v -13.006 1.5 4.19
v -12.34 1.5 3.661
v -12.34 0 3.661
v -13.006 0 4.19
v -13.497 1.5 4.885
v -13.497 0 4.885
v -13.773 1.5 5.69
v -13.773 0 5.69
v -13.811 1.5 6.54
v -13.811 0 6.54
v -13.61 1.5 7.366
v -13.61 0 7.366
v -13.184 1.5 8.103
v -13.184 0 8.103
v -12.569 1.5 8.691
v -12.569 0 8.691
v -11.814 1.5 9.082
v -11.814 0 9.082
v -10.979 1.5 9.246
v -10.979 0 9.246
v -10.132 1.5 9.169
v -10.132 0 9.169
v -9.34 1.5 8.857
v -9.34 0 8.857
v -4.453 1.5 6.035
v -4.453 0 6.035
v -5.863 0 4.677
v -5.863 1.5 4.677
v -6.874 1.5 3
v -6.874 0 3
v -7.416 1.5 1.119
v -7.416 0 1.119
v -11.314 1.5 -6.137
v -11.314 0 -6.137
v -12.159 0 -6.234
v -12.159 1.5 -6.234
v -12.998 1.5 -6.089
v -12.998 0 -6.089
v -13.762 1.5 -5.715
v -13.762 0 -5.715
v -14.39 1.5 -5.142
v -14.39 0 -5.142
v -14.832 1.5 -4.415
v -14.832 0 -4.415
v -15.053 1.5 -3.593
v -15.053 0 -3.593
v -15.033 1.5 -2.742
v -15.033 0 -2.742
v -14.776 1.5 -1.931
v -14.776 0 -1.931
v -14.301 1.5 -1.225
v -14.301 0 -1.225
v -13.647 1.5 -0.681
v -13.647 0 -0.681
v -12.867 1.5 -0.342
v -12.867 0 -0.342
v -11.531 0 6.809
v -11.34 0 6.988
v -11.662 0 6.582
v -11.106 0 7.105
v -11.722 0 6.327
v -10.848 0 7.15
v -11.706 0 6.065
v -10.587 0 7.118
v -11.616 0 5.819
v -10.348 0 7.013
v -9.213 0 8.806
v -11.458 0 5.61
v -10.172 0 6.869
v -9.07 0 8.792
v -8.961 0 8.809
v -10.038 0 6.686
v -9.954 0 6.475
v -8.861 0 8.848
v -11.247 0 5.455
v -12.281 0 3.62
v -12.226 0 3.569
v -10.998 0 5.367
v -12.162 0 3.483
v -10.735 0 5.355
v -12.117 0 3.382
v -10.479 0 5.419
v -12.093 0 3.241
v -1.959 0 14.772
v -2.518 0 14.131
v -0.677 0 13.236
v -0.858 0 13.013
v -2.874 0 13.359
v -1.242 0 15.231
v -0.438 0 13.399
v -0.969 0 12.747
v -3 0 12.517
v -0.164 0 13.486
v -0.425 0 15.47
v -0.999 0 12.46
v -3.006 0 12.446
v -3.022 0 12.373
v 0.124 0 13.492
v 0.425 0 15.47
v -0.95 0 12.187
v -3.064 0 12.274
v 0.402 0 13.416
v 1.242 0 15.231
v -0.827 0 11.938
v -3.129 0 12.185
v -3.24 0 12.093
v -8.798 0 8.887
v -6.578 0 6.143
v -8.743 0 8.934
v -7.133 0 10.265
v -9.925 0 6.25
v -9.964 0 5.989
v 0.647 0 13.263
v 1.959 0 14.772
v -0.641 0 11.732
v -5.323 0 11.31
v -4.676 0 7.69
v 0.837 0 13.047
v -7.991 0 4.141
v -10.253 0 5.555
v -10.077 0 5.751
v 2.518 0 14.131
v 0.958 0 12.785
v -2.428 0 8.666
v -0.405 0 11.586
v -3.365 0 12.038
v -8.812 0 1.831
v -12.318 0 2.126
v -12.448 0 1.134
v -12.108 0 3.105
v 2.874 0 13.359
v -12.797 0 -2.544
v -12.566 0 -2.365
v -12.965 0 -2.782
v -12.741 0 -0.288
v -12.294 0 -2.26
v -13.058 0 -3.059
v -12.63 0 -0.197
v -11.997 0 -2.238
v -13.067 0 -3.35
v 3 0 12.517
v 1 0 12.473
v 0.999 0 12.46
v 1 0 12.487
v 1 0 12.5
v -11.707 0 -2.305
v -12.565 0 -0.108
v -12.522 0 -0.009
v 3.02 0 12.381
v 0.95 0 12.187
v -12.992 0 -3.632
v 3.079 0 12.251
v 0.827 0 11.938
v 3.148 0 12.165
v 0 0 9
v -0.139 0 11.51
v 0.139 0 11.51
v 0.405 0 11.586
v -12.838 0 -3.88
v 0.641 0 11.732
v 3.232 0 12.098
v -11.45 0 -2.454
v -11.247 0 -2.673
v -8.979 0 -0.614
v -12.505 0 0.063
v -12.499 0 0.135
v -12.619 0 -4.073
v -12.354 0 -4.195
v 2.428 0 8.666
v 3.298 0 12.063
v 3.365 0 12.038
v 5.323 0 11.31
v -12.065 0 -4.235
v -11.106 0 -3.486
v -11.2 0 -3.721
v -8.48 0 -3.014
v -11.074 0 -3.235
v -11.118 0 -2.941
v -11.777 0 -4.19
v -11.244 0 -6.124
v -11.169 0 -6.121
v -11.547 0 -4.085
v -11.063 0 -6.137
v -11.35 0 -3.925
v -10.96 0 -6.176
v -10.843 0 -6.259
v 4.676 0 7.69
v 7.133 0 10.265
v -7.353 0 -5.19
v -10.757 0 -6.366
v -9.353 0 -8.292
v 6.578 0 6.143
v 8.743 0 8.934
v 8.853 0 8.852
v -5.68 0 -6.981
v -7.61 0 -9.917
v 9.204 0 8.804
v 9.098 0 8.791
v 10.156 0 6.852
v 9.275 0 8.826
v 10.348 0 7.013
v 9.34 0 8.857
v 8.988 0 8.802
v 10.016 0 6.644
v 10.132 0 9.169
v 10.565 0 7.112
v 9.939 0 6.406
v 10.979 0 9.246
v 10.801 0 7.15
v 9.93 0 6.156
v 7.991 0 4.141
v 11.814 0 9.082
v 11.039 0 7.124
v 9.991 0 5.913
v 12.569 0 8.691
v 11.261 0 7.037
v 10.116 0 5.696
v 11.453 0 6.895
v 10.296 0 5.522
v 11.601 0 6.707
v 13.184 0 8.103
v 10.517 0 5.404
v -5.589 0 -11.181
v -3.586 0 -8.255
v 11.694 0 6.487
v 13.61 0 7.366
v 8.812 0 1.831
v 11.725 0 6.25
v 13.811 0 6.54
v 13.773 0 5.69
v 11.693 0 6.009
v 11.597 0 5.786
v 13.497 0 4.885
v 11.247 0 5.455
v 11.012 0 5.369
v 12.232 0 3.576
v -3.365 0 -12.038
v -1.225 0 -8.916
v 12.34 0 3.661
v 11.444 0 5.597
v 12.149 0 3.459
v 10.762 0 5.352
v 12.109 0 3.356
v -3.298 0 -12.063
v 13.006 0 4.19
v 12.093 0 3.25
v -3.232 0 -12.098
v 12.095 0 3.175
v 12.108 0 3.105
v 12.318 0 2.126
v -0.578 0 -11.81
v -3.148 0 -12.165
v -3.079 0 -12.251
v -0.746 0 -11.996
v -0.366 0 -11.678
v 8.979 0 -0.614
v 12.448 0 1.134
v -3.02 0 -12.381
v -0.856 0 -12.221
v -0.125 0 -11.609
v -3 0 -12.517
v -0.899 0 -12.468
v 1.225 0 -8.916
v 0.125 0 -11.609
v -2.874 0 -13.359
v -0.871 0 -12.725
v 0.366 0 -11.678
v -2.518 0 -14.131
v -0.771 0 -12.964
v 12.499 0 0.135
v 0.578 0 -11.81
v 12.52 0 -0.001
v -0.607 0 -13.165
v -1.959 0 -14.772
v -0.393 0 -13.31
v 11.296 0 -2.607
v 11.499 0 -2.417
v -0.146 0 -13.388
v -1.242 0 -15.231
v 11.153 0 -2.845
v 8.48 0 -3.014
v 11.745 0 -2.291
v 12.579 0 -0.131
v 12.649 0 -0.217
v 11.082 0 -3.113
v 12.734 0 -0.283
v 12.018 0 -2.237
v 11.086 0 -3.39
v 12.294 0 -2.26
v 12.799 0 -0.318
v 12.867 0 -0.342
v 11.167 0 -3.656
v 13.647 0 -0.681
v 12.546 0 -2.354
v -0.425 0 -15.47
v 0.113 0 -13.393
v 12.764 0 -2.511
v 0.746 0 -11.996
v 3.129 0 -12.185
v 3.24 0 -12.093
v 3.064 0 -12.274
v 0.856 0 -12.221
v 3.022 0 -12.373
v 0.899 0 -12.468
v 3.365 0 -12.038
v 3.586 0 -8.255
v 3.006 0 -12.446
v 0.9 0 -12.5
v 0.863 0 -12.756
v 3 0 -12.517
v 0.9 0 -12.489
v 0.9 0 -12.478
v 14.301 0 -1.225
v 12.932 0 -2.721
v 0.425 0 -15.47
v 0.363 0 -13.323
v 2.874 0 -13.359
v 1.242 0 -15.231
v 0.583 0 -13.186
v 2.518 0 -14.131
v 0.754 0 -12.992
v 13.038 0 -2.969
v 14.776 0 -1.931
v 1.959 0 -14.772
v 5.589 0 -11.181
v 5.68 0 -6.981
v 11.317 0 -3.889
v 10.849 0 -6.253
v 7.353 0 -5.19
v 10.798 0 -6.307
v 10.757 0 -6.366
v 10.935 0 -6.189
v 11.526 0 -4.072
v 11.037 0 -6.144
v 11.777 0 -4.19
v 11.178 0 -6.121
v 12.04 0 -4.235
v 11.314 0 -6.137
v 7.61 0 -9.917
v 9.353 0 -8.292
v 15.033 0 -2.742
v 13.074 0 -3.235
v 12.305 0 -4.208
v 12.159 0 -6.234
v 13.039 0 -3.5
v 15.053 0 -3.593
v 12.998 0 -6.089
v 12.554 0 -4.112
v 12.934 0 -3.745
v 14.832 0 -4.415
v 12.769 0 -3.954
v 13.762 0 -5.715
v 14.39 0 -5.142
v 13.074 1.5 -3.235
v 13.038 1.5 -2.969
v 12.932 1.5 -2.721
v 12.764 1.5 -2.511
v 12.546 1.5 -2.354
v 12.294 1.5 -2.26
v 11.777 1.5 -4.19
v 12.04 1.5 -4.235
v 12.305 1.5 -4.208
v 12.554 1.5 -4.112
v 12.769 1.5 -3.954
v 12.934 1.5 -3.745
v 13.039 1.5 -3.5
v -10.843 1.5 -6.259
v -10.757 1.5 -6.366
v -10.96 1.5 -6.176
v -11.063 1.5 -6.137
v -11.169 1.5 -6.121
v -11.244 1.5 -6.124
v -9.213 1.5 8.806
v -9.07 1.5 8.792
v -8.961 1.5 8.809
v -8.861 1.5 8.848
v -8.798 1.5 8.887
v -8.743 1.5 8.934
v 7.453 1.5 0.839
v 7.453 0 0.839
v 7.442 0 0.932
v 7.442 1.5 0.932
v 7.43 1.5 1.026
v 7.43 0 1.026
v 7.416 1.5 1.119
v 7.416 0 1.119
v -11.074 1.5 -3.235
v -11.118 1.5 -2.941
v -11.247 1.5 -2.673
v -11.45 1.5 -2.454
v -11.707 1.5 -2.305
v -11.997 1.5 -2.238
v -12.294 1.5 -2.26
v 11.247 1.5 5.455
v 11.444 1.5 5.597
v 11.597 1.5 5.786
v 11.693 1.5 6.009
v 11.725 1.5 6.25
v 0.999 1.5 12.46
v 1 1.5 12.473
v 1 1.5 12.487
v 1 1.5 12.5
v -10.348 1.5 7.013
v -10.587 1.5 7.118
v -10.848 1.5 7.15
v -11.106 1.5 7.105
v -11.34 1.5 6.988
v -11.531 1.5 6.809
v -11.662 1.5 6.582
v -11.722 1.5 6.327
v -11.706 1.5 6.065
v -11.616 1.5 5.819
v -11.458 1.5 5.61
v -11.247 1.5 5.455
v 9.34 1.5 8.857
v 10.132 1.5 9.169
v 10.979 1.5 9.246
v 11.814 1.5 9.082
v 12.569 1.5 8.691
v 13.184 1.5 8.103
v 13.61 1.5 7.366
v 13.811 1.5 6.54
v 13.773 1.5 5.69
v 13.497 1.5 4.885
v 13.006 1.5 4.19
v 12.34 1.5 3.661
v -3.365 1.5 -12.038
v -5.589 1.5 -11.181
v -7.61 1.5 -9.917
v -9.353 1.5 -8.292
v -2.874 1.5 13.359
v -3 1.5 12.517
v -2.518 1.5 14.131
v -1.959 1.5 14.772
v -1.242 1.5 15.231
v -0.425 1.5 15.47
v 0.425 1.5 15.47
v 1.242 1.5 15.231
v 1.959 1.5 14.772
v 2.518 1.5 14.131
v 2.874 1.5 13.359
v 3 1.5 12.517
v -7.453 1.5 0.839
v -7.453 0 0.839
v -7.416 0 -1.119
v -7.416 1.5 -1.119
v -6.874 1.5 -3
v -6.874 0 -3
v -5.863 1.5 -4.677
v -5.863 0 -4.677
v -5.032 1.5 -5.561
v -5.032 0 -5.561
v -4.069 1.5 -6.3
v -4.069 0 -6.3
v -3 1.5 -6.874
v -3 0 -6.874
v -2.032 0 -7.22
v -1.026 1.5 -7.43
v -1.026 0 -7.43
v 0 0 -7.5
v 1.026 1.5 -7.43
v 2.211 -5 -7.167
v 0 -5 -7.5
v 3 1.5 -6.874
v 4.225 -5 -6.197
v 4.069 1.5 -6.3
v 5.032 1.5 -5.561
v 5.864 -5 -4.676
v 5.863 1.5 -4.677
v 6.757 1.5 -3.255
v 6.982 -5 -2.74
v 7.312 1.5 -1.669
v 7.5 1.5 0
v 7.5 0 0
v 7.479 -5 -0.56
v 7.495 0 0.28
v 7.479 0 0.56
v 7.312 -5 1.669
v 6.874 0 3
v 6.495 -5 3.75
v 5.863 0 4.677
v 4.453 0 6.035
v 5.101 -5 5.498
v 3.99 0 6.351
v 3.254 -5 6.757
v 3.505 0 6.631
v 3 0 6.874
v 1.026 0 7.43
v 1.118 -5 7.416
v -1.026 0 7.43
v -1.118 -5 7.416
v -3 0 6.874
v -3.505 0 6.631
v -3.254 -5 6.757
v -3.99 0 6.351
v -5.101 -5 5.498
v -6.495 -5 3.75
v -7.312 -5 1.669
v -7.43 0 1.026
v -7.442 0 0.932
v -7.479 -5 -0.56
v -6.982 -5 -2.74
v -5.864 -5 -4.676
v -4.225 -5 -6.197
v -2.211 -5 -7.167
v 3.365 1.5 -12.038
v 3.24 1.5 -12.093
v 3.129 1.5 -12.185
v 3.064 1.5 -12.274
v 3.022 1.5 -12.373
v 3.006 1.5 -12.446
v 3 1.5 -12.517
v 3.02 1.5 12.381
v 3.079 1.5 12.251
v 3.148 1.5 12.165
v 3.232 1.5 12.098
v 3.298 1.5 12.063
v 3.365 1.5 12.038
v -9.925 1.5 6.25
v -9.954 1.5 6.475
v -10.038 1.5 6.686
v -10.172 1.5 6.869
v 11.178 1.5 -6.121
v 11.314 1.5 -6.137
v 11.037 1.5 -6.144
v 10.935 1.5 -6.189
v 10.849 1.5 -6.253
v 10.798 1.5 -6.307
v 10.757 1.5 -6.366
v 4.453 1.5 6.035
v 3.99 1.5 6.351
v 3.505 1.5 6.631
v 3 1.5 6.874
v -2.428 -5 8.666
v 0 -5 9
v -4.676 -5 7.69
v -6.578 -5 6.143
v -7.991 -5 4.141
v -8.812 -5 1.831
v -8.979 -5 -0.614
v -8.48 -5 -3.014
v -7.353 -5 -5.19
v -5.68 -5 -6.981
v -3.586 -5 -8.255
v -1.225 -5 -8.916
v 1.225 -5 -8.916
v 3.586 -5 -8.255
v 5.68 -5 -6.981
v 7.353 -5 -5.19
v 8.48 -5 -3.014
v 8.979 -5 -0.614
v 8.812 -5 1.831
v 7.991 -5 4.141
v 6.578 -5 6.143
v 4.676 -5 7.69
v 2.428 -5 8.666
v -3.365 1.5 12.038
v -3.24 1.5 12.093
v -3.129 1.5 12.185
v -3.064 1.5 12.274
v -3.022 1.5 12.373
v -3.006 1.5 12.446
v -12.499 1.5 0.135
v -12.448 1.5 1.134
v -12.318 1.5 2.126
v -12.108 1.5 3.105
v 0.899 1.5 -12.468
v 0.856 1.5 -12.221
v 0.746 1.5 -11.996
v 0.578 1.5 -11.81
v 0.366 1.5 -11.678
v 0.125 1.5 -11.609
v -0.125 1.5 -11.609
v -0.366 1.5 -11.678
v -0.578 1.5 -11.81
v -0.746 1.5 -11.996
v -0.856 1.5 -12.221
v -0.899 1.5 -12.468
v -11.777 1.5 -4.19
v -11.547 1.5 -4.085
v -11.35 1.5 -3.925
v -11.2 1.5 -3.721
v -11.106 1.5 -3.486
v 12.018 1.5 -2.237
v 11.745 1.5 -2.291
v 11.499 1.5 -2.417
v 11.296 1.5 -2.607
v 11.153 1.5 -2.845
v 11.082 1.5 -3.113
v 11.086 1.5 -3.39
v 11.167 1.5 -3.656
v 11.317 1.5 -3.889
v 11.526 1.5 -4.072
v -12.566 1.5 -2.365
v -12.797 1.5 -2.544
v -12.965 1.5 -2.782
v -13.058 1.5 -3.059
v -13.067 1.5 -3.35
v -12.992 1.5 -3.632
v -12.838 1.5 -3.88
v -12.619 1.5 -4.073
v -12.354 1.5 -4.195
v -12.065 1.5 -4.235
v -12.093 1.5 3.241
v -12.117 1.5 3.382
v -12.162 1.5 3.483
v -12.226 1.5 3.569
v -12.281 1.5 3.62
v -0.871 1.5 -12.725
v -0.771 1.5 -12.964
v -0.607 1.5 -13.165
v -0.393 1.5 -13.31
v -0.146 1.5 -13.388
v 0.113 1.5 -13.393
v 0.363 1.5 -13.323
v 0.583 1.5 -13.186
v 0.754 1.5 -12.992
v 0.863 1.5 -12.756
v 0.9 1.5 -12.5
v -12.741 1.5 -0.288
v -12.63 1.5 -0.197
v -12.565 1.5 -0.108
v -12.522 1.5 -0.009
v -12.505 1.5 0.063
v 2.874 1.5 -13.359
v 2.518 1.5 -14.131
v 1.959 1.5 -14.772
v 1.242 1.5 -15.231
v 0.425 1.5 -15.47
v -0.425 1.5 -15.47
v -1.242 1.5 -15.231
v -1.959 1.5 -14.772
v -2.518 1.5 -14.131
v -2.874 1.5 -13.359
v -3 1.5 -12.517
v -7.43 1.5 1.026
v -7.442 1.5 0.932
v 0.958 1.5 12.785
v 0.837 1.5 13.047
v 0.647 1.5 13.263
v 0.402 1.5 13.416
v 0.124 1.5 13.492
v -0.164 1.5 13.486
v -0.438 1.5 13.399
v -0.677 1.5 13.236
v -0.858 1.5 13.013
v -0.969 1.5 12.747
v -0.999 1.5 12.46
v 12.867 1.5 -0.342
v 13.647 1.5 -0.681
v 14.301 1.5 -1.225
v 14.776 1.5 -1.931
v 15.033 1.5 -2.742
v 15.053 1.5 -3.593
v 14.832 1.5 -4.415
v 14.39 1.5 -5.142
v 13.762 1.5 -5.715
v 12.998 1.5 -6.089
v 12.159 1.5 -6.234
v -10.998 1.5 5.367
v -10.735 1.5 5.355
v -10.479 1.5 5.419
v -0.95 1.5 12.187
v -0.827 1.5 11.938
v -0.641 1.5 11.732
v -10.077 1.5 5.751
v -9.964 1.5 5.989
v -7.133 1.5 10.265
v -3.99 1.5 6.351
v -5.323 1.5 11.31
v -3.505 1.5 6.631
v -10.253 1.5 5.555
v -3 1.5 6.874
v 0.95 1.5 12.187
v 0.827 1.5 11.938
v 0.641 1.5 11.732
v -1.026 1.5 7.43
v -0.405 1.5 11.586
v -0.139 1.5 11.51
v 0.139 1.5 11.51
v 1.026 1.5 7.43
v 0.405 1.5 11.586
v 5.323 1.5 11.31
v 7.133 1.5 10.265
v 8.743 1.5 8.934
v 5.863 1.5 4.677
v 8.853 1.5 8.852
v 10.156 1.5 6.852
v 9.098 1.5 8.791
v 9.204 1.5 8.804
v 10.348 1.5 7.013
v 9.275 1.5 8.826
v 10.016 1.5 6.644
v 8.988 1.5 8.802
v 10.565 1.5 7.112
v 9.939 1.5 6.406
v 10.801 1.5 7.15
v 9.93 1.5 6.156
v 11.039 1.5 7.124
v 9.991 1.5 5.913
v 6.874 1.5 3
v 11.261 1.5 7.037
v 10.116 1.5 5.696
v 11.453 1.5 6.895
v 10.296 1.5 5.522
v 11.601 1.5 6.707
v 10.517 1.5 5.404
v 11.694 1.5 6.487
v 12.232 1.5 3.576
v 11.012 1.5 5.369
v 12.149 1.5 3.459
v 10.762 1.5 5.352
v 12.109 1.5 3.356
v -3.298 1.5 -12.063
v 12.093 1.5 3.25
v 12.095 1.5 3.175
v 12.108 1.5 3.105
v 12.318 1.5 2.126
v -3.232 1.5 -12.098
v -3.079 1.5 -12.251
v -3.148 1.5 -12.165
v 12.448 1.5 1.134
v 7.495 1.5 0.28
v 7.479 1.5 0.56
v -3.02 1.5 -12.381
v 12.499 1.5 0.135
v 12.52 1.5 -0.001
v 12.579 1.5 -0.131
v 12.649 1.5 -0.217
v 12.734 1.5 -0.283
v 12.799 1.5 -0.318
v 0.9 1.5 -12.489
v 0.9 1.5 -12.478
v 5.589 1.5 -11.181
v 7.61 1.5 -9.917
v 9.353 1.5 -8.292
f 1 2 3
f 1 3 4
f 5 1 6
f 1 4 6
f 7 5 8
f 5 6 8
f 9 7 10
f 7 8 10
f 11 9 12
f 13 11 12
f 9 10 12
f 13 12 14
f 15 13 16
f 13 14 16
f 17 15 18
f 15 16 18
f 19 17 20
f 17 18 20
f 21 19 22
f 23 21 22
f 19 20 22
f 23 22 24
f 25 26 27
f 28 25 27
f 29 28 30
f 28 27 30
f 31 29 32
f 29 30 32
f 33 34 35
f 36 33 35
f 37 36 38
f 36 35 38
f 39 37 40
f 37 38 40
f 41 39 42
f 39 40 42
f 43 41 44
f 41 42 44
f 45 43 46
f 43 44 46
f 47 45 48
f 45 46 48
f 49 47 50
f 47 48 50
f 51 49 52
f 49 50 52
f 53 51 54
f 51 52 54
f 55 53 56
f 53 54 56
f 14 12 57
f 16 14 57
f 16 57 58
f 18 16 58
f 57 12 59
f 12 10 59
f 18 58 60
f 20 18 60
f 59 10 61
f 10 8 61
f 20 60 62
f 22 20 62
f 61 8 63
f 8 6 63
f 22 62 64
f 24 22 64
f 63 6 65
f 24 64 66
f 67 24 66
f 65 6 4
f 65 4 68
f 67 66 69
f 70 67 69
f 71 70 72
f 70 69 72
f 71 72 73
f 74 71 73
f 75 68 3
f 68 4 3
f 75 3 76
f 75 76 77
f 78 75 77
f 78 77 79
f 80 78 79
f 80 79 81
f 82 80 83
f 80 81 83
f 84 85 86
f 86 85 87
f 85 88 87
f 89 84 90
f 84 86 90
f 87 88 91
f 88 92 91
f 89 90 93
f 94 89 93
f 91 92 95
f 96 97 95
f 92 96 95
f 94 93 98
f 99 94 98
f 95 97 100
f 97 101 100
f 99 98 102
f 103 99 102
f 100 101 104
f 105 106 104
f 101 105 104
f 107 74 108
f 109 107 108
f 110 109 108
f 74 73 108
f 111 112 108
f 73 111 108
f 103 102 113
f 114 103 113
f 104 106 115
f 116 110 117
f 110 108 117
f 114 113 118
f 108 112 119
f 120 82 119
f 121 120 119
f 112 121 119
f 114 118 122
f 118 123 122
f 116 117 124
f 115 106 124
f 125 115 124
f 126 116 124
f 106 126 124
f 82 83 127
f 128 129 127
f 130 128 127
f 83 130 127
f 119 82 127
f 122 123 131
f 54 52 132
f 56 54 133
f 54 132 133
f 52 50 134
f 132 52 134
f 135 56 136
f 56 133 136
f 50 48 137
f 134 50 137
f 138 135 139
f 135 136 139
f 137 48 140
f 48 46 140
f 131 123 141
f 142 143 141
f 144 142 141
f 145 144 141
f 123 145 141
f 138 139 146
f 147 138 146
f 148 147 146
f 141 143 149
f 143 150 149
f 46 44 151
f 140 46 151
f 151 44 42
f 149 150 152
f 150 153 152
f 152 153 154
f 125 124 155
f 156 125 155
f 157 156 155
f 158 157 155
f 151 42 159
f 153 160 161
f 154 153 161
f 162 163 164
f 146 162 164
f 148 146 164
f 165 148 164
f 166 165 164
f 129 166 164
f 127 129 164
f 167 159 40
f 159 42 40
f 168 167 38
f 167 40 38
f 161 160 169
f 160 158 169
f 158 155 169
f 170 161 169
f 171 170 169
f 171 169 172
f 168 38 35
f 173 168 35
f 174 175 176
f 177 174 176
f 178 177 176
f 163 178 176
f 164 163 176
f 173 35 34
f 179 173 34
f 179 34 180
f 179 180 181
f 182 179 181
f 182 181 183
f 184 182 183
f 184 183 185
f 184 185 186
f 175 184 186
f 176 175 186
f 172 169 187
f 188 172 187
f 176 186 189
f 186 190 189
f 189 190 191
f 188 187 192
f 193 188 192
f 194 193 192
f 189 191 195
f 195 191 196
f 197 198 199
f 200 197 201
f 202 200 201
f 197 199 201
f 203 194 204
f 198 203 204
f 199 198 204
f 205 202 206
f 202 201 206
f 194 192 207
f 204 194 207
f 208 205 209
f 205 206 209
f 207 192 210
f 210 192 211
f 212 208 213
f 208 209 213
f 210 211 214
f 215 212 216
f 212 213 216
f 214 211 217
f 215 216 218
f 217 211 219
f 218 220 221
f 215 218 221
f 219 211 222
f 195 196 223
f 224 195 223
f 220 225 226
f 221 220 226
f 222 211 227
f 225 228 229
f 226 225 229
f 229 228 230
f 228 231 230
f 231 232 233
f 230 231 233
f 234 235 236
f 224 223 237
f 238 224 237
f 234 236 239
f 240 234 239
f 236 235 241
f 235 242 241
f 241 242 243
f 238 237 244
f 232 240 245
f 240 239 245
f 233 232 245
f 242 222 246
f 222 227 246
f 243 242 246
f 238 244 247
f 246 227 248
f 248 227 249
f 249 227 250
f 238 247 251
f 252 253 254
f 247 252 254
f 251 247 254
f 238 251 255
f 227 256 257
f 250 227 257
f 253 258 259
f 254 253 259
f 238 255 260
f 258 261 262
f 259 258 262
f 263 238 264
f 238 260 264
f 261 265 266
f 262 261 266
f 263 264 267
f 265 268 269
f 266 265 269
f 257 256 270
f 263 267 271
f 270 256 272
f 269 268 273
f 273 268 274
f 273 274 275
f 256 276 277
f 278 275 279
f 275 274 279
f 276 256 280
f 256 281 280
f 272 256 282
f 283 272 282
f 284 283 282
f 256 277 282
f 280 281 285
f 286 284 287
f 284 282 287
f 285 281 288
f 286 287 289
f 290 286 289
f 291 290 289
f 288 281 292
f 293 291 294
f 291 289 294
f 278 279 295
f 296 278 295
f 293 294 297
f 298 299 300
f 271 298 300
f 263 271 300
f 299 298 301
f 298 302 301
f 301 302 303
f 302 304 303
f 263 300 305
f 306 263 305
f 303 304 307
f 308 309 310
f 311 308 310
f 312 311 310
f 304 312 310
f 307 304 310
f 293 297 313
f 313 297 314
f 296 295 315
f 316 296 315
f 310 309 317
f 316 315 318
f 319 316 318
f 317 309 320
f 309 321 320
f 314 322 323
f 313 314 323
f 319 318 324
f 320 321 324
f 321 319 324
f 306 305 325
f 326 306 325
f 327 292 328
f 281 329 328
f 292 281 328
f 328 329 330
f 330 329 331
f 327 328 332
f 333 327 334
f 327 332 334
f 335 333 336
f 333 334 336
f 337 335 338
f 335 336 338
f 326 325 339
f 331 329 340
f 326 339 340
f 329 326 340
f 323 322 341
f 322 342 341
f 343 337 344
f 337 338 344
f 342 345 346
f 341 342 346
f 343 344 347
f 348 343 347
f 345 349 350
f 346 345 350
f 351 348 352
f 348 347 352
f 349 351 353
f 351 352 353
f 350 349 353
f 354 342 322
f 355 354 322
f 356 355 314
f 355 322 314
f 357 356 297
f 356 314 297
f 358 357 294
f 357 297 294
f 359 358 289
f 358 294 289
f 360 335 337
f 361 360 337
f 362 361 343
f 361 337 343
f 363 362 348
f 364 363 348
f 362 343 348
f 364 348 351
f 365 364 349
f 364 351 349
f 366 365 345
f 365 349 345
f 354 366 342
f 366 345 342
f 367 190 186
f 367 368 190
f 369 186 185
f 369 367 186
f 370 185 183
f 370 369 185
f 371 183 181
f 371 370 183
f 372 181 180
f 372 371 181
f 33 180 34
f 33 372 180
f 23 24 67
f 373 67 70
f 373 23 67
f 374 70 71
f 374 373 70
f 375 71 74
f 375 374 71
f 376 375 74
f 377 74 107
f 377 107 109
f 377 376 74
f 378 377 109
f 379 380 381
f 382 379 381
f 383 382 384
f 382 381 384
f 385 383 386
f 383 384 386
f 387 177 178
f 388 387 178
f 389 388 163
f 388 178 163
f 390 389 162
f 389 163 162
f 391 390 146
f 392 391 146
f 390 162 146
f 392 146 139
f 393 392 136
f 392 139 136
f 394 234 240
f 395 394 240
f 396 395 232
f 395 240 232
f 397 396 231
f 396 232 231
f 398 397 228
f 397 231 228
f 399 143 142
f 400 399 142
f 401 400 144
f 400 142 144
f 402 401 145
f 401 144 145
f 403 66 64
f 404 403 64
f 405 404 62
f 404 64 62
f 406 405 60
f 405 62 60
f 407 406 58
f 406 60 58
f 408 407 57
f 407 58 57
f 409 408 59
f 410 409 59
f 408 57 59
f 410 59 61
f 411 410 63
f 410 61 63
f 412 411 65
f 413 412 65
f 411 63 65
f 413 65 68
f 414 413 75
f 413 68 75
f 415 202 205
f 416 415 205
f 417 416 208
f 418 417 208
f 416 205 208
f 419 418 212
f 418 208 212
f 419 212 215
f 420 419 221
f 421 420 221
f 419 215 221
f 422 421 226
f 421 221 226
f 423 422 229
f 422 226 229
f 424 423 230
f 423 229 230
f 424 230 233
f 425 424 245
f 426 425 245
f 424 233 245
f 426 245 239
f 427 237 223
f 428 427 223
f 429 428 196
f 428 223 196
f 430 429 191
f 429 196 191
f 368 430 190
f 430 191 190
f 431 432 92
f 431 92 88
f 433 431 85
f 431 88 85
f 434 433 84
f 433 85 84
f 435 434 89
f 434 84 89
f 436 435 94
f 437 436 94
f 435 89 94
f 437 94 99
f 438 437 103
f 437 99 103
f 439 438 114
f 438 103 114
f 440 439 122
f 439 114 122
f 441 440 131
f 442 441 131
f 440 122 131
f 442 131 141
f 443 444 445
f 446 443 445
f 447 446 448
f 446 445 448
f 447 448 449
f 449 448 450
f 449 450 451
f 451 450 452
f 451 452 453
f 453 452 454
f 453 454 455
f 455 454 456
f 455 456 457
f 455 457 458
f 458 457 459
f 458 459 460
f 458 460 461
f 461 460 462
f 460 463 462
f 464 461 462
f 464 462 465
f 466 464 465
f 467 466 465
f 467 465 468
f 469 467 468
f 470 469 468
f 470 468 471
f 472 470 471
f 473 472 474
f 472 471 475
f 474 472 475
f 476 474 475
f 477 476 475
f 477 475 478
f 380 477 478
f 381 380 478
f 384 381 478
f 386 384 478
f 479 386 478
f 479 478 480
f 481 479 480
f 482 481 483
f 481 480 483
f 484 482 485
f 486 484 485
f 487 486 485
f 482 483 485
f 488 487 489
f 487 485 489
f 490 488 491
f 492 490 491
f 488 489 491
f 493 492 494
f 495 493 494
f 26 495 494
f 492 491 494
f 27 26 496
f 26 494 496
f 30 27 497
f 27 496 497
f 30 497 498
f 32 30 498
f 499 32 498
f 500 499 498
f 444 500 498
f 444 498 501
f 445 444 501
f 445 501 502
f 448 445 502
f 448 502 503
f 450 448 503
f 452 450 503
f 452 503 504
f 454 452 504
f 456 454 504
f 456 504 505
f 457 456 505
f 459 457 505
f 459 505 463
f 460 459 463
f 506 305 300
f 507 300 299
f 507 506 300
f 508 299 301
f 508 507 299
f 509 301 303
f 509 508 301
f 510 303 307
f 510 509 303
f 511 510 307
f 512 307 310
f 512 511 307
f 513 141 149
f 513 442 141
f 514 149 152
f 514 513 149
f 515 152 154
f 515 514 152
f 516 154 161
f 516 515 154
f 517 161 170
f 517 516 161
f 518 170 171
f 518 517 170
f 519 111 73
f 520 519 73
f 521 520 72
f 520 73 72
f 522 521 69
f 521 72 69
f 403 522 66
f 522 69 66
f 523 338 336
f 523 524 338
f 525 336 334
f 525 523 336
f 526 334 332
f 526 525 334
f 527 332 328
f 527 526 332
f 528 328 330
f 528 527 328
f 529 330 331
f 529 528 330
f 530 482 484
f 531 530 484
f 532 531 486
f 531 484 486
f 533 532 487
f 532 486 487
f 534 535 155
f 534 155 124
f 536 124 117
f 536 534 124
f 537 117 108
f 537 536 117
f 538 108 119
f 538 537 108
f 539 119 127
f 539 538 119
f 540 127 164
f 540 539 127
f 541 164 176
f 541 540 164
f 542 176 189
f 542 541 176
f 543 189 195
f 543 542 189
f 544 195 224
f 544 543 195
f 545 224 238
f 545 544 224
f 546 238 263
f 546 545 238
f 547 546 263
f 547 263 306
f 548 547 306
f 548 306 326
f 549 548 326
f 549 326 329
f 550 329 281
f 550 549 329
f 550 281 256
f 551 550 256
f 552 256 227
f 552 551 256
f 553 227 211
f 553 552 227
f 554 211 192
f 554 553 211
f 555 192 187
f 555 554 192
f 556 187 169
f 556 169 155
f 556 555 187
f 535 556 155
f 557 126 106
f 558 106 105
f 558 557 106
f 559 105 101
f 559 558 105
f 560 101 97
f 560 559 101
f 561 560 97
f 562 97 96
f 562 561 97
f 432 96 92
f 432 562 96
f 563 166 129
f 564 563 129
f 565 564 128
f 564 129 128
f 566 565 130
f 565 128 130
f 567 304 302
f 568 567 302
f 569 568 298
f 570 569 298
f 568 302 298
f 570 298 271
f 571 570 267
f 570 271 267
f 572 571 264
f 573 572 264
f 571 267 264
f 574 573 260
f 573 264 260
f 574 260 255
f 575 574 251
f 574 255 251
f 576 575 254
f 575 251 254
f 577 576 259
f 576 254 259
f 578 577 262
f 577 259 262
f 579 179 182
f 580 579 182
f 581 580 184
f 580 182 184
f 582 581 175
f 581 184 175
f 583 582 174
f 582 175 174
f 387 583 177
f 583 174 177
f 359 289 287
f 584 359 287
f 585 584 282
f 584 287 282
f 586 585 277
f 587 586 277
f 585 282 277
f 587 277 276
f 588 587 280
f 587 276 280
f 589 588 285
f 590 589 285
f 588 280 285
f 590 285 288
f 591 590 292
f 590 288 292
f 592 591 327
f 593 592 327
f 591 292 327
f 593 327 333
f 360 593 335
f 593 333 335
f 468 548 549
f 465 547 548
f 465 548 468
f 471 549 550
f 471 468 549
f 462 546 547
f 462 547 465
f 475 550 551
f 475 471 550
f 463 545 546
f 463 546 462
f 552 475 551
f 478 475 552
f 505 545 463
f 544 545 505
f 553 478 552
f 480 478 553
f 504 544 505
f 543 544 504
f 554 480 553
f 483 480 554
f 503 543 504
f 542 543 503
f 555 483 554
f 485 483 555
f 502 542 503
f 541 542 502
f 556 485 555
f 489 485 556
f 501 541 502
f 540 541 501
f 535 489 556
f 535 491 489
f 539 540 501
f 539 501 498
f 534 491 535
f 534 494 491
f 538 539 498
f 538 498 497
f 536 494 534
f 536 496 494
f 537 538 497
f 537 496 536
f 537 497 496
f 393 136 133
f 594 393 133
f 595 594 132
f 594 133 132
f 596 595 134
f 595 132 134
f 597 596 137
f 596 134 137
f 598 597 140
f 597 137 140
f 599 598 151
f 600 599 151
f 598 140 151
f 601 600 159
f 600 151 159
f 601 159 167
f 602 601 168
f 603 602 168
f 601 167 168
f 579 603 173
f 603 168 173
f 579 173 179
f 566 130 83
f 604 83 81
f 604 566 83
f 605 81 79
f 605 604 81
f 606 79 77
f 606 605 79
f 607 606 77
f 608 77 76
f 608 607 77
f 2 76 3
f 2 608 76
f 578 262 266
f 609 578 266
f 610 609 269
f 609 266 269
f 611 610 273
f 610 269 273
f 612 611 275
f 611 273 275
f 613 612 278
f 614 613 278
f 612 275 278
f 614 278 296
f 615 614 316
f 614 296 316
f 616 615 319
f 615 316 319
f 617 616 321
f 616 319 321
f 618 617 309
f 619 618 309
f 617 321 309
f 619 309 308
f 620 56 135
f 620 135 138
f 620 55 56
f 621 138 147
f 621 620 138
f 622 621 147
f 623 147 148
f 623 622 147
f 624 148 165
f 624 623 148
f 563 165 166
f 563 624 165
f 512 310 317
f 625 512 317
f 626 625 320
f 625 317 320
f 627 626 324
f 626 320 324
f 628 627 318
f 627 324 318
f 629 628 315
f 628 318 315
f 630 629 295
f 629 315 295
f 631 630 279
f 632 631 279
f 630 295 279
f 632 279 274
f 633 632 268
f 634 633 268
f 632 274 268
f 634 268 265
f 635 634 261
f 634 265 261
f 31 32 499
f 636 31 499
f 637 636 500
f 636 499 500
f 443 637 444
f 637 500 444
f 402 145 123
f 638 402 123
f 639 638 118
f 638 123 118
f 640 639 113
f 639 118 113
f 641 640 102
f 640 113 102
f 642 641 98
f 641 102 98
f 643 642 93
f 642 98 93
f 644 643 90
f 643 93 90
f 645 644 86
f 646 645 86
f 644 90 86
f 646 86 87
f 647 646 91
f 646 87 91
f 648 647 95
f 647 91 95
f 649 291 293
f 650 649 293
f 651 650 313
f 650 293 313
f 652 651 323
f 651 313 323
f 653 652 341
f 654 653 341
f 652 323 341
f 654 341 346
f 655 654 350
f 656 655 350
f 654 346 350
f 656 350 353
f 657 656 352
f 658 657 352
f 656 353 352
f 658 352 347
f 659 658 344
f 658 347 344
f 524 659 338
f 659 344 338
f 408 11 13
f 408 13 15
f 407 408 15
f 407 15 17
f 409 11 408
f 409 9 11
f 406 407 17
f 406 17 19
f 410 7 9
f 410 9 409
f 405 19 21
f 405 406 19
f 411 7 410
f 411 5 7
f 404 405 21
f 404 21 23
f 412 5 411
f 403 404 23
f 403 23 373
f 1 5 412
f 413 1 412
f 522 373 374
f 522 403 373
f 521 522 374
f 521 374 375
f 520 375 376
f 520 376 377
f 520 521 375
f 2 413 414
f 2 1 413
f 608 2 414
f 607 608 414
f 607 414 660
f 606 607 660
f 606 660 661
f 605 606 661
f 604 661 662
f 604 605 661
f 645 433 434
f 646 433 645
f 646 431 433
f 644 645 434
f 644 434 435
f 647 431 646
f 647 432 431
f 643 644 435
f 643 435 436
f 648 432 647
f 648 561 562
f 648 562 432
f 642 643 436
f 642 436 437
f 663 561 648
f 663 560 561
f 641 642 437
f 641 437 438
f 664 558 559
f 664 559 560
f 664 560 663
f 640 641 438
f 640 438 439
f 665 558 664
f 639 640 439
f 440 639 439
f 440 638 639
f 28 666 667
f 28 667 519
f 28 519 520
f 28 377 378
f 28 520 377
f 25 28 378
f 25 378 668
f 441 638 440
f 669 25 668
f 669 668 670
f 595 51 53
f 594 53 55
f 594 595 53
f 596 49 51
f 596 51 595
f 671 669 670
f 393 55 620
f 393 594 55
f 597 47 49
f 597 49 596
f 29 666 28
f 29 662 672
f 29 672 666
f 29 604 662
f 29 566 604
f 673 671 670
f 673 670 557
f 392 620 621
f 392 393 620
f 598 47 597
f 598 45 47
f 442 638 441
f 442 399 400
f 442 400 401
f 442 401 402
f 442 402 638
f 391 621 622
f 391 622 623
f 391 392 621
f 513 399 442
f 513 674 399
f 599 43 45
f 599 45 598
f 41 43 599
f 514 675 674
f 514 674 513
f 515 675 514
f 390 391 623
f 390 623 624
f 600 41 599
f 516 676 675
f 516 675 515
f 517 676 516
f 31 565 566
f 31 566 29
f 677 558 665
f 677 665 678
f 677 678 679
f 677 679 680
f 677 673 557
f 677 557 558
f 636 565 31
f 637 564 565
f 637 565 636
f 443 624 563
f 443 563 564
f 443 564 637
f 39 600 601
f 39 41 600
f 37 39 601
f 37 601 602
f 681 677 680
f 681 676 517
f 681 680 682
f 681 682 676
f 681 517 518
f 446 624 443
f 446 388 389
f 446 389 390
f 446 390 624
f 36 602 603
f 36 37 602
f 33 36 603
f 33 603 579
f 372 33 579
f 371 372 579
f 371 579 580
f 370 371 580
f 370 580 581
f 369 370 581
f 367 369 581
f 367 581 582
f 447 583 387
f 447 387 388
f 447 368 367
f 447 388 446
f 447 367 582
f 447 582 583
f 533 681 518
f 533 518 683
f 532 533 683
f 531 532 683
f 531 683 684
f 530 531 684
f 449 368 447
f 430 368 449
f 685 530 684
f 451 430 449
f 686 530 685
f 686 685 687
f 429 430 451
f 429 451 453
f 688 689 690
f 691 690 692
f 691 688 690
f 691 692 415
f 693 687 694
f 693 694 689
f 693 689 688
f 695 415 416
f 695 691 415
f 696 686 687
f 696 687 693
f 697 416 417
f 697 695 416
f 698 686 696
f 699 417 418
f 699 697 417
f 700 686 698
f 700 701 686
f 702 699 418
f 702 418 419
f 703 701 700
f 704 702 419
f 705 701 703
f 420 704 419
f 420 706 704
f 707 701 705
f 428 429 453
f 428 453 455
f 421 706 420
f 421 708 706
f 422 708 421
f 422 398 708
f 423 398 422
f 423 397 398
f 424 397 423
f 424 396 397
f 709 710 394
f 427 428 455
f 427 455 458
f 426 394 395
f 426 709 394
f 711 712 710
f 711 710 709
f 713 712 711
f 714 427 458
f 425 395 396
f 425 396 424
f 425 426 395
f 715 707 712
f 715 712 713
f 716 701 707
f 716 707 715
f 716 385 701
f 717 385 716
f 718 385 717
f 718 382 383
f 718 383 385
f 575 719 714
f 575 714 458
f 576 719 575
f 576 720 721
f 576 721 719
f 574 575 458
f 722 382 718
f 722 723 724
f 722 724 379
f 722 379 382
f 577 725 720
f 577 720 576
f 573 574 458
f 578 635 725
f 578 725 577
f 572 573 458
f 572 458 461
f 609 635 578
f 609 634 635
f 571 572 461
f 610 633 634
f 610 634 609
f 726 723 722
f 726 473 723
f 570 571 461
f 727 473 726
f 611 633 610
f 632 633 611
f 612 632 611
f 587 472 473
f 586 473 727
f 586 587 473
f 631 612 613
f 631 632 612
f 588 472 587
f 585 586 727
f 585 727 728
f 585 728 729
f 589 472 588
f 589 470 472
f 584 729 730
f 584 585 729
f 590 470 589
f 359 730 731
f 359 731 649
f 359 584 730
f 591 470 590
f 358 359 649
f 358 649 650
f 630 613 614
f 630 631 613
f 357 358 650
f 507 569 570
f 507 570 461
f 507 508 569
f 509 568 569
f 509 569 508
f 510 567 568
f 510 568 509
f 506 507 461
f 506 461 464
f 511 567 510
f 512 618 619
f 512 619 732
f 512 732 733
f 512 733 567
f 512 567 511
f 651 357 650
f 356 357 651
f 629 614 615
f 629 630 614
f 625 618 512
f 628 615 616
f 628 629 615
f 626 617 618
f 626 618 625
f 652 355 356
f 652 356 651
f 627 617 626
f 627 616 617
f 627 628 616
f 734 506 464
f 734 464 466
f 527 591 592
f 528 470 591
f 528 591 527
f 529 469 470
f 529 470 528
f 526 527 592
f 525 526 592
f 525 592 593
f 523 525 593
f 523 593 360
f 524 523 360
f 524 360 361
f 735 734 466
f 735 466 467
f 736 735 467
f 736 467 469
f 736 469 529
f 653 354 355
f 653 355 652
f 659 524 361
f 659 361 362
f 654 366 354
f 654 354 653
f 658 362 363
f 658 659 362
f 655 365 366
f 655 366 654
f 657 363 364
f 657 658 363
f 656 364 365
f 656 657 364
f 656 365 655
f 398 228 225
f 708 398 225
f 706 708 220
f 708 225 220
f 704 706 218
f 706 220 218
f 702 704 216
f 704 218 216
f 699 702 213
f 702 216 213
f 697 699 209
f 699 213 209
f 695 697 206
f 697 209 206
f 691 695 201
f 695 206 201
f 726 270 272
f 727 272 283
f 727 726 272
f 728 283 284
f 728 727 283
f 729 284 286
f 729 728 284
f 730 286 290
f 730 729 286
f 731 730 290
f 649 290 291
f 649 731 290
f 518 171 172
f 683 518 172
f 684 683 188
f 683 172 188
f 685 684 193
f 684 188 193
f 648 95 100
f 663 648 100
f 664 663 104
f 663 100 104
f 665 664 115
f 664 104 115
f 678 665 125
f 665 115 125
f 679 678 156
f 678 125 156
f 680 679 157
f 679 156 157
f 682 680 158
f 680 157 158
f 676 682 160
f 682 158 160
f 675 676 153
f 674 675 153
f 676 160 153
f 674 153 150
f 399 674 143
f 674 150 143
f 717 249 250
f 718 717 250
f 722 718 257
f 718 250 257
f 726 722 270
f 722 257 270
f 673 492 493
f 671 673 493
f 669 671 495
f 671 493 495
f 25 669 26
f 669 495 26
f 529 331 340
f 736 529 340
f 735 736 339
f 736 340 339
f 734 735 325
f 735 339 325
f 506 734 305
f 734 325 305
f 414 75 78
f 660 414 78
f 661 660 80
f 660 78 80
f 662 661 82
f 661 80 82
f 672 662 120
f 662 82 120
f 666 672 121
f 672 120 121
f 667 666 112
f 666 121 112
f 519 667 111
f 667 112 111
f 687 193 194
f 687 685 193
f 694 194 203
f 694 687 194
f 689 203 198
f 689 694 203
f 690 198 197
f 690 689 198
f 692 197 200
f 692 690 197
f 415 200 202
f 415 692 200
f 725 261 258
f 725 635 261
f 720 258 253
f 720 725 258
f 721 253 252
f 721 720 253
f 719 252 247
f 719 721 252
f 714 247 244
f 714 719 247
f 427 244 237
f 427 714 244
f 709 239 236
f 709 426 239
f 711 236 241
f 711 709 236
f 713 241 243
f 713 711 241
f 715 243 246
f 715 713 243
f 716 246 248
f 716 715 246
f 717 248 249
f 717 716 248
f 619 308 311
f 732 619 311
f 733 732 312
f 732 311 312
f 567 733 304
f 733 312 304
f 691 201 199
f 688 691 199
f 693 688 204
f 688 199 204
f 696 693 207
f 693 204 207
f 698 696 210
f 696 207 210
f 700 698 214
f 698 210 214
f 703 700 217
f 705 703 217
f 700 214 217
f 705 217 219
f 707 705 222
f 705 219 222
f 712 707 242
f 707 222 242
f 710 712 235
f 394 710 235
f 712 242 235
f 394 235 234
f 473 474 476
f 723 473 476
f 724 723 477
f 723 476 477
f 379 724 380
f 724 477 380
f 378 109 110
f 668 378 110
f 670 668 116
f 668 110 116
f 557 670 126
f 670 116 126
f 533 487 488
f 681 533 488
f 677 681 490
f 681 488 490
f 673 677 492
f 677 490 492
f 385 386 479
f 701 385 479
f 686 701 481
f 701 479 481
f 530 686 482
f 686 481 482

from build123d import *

# Parameters (mm, degrees)
BOSS_EXTRUDE1_DEPTH = 1.5
FILLET1_R           = 0.5
BOSS_EXTRUDE2_START = 5
SKETCH2_R           = 9
SKETCH2_R_2         = 7.5
BOSS_EXTRUDE2_DEPTH = 5


with BuildPart() as part:
    # Sketch1 → Boss-Extrude1 (new body)
    with BuildSketch(Plane(origin=(0, 0, 0), x_dir=(1, 0, 0), z_dir=(0, 1, 0))):
        with BuildLine():
            ThreePointArc((0.899416611, 12.4676), (1.956802124, 12.345886985), (3, 12.1346611))
            Line((3, 12.1346611), (3, 12.5))
            ThreePointArc((3, 12.5), (0, 15.5), (-3, 12.5))
            Line((-3, 12.5), (-3, 12.1346611))
            ThreePointArc((-3, 12.1346611), (-1.956802124, 12.345886985), (-0.899416611, 12.4676))
            ThreePointArc((-0.899416611, 12.4676), (-0.016202626, 13.399854141), (0.9, 12.5))
            ThreePointArc((0.9, 12.5), (0.899854141, 12.483797374), (0.899416611, 12.4676))
        make_face()
        with BuildLine():
            ThreePointArc((-3, 6.873863542), (0, 7.5), (3, 6.873863542))
            Line((3, 6.873863542), (3, 12.1346611))
            ThreePointArc((3, 12.1346611), (1.956802124, 12.345886985), (0.899416611, 12.4676))
            ThreePointArc((0.899416611, 12.4676), (0, 11.6), (-0.899416611, 12.4676))
            ThreePointArc((-0.899416611, 12.4676), (-1.956802124, 12.345886985), (-3, 12.1346611))
            Line((-3, 12.1346611), (-3, 6.873863542))
        make_face()
        with BuildLine():
            Line((3, 12.1346611), (3, 6.873863542))
            ThreePointArc((3, 6.873863542), (4.565710718, 5.950150052), (5.863185187, 4.676864277))
            Line((5.863185187, 4.676864277), (10.944725414, 6.038458877))
            ThreePointArc((10.944725414, 6.038458877), (7.609517863, 9.916916754), (3, 12.1346611))
        make_face()
        with BuildLine():
            ThreePointArc((7.5, 0), (7.48822587, -0.420087268), (7.45294045, -0.83885556))
            Line((7.45294045, -0.83885556), (7.772310826, -1.023244132))
            Line((7.772310826, -1.023244132), (12.497639685, 0.24290392))
            ThreePointArc((12.497639685, 0.24290392), (12.43679381, 1.255451998), (12.294047703, 2.259732526))
            ThreePointArc((12.294047703, 2.259732526), (11.108147002, 2.976419019), (11.776823889, 4.190038078))
            ThreePointArc((11.776823889, 4.190038078), (11.39830538, 5.131143582), (10.944725414, 6.038458877))
            Line((10.944725414, 6.038458877), (5.863185187, 4.676864277))
            ThreePointArc((5.863185187, 4.676864277), (7.078979054, 2.477509949), (7.5, 0))
        make_face()
        with BuildLine():
            ThreePointArc((12.294047703, 2.259732526), (12.43679381, 1.255451998), (12.497639685, 0.24290392))
            Line((12.497639685, 0.24290392), (12.850529964, 0.337460585))
            ThreePointArc((12.850529964, 0.337460585), (14.971850307, 4.011695199), (11.297615693, 6.133015543))
            Line((11.297615693, 6.133015543), (10.944725414, 6.038458877))
            ThreePointArc((10.944725414, 6.038458877), (11.39830538, 5.131143582), (11.776823889, 4.190038078))
            ThreePointArc((11.776823889, 4.190038078), (12.666842202, 4.040610319), (13.074072829, 3.235238064))
            ThreePointArc((13.074072829, 3.235238064), (12.855089754, 2.610728206), (12.294047703, 2.259732526))
        make_face()
        with BuildLine():
            Line((12.497639685, 0.24290392), (7.772310826, -1.023244132))
            Line((7.772310826, -1.023244132), (12.008924778, -3.469254338))
            ThreePointArc((12.008924778, -3.469254338), (12.376622312, -1.751918986), (12.5, 0))
            ThreePointArc((12.5, 0), (12.499409907, 0.121457693), (12.497639685, 0.24290392))
        make_face()
        with BuildLine():
            ThreePointArc((7.45294045, -0.83885556), (7.43583646, -0.978946442), (7.416099457, -1.118690681))
            Line((7.416099457, -1.118690681), (7.772310826, -1.023244132))
            Line((7.772310826, -1.023244132), (7.45294045, -0.83885556))
        make_face()
        with BuildLine():
            Line((7.772310826, -1.023244132), (7.416099457, -1.118690681))
            ThreePointArc((7.416099457, -1.118690681), (6.42347811, -3.871553818), (4.45294045, -6.035007983))
            Line((4.45294045, -6.035007983), (9.008924778, -8.665406761))
            ThreePointArc((9.008924778, -8.665406761), (9.713450699, -7.867583842), (10.347550019, -7.012717634))
            ThreePointArc((10.347550019, -7.012717634), (10.045894684, -5.8), (11.24696663, -5.454882366))
            ThreePointArc((11.24696663, -5.454882366), (11.670252823, -4.478303143), (12.008924778, -3.469254338))
            Line((12.008924778, -3.469254338), (7.772310826, -1.023244132))
        make_face()
        with BuildLine():
            ThreePointArc((10.347550019, -7.012717634), (9.713450699, -7.867583842), (9.008924778, -8.665406761))
            Line((9.008924778, -8.665406761), (9.325317547, -8.848076211))
            ThreePointArc((9.325317547, -8.848076211), (13.423393759, -7.75), (12.325317547, -3.651923789))
            Line((12.325317547, -3.651923789), (12.008924778, -3.469254338))
            ThreePointArc((12.008924778, -3.469254338), (11.670252823, -4.478303143), (11.24696663, -5.454882366))
            ThreePointArc((11.24696663, -5.454882366), (11.59651278, -5.786041044), (11.725317547, -6.25))
            ThreePointArc((11.725317547, -6.25), (11.261212732, -7.037397859), (10.347550019, -7.012717634))
        make_face()
        with BuildLine():
            ThreePointArc((4.45294045, -6.035007983), (3.75, -6.495190528), (3, -6.873863542))
            Line((3, -6.873863542), (3, -12.1346611))
            ThreePointArc((3, -12.1346611), (6.25, -10.825317547), (9.008924778, -8.665406761))
            Line((9.008924778, -8.665406761), (4.45294045, -6.035007983))
        make_face()
        with BuildLine():
            Line((3, -12.1346611), (3, -6.873863542))
            ThreePointArc((3, -6.873863542), (0, -7.5), (-3, -6.873863542))
            Line((-3, -6.873863542), (-3, -12.1346611))
            ThreePointArc((-3, -12.1346611), (-2.00620559, -12.337955225), (-0.99919968, -12.46))
            ThreePointArc((-0.99919968, -12.46), (0, -11.5), (0.99919968, -12.46))
            ThreePointArc((0.99919968, -12.46), (2.00620559, -12.337955225), (3, -12.1346611))
        make_face()
        with BuildLine():
            Line((3, -12.5), (3, -12.1346611))
            ThreePointArc((3, -12.1346611), (2.00620559, -12.337955225), (0.99919968, -12.46))
            ThreePointArc((0.99919968, -12.46), (0.9997999, -12.479995997), (1, -12.5))
            ThreePointArc((1, -12.5), (-0.020004003, -13.4997999), (-0.99919968, -12.46))
            ThreePointArc((-0.99919968, -12.46), (-2.00620559, -12.337955225), (-3, -12.1346611))
            Line((-3, -12.1346611), (-3, -12.5))
            ThreePointArc((-3, -12.5), (0, -15.5), (3, -12.5))
        make_face()
        with BuildLine():
            Line((-3, -12.1346611), (-3, -6.873863542))
            ThreePointArc((-3, -6.873863542), (-3.75, -6.495190528), (-4.45294045, -6.035007983))
            Line((-4.45294045, -6.035007983), (-9.008924778, -8.665406761))
            ThreePointArc((-9.008924778, -8.665406761), (-6.25, -10.825317547), (-3, -12.1346611))
        make_face()
        with BuildLine():
            Line((-9.008924778, -8.665406761), (-4.45294045, -6.035007983))
            ThreePointArc((-4.45294045, -6.035007983), (-6.42347811, -3.871553818), (-7.416099457, -1.118690681))
            Line((-7.416099457, -1.118690681), (-7.772310826, -1.023244132))
            Line((-7.772310826, -1.023244132), (-12.008924778, -3.469254338))
            ThreePointArc((-12.008924778, -3.469254338), (-11.670252823, -4.478303143), (-11.24696663, -5.454882366))
            ThreePointArc((-11.24696663, -5.454882366), (-10.361358591, -5.478804767), (-9.925317547, -6.25))
            ThreePointArc((-9.925317547, -6.25), (-10.037919689, -6.685895185), (-10.347550019, -7.012717634))
            ThreePointArc((-10.347550019, -7.012717634), (-9.713450699, -7.867583842), (-9.008924778, -8.665406761))
        make_face()
        with BuildLine():
            Line((-9.325317547, -8.848076211), (-9.008924778, -8.665406761))
            ThreePointArc((-9.008924778, -8.665406761), (-9.713450699, -7.867583842), (-10.347550019, -7.012717634))
            ThreePointArc((-10.347550019, -7.012717634), (-11.604740411, -6.7), (-11.24696663, -5.454882366))
            ThreePointArc((-11.24696663, -5.454882366), (-11.670252823, -4.478303143), (-12.008924778, -3.469254338))
            Line((-12.008924778, -3.469254338), (-12.325317547, -3.651923789))
            ThreePointArc((-12.325317547, -3.651923789), (-13.423393759, -7.75), (-9.325317547, -8.848076211))
        make_face()
        with BuildLine():
            Line((-7.772310826, -1.023244132), (-7.416099457, -1.118690681))
            ThreePointArc((-7.416099457, -1.118690681), (-7.43583646, -0.978946442), (-7.45294045, -0.83885556))
            Line((-7.45294045, -0.83885556), (-7.772310826, -1.023244132))
        make_face()
        with BuildLine():
            Line((-12.008924778, -3.469254338), (-7.772310826, -1.023244132))
            Line((-7.772310826, -1.023244132), (-12.497639685, 0.24290392))
            ThreePointArc((-12.497639685, 0.24290392), (-12.393060767, -1.631577403), (-12.008924778, -3.469254338))
        make_face()
        with BuildLine():
            ThreePointArc((-7.45294045, -0.83885556), (-7.206635264, 2.07711535), (-5.863185187, 4.676864277))
            Line((-5.863185187, 4.676864277), (-10.944725414, 6.038458877))
            ThreePointArc((-10.944725414, 6.038458877), (-11.39830538, 5.131143582), (-11.776823889, 4.190038078))
            ThreePointArc((-11.776823889, 4.190038078), (-11.268700573, 3.828007437), (-11.074072829, 3.235238064))
            ThreePointArc((-11.074072829, 3.235238064), (-11.44956297, 2.454221139), (-12.294047703, 2.259732526))
            ThreePointArc((-12.294047703, 2.259732526), (-12.43679381, 1.255451998), (-12.497639685, 0.24290392))
            Line((-12.497639685, 0.24290392), (-7.772310826, -1.023244132))
            Line((-7.772310826, -1.023244132), (-7.45294045, -0.83885556))
        make_face()
        with BuildLine():
            ThreePointArc((-11.776823889, 4.190038078), (-11.39830538, 5.131143582), (-10.944725414, 6.038458877))
            Line((-10.944725414, 6.038458877), (-11.297615693, 6.133015543))
            ThreePointArc((-11.297615693, 6.133015543), (-14.971850307, 4.011695199), (-12.850529964, 0.337460585))
            Line((-12.850529964, 0.337460585), (-12.497639685, 0.24290392))
            ThreePointArc((-12.497639685, 0.24290392), (-12.43679381, 1.255451998), (-12.294047703, 2.259732526))
            ThreePointArc((-12.294047703, 2.259732526), (-13.039998655, 3.494057109), (-11.776823889, 4.190038078))
        make_face()
        with BuildLine():
            ThreePointArc((-5.863185187, 4.676864277), (-4.565710718, 5.950150052), (-3, 6.873863542))
            Line((-3, 6.873863542), (-3, 12.1346611))
            ThreePointArc((-3, 12.1346611), (-7.609517863, 9.916916754), (-10.944725414, 6.038458877))
            Line((-10.944725414, 6.038458877), (-5.863185187, 4.676864277))
        make_face()
    extrude(amount=BOSS_EXTRUDE1_DEPTH)

    # Fillet1
    fillet1_edges = [part.edges().sort_by_distance(p)[0] for p in [
        (-3, 0.75, 12.1346611),
        (3, 0.75, 12.1346611),
        (9.008924778, 0.75, 8.665406761),
        (12.008924778, 0.75, 3.469254338),
        (12.497639685, 0.75, -0.24290392),
        (10.944725414, 0.75, -6.038458877),
        (3, 0.75, -12.1346611),
        (-3, 0.75, -12.1346611),
        (-10.944725414, 0.75, -6.038458877),
        (-12.497639685, 0.75, -0.24290392),
        (-12.008924778, 0.75, 3.469254338),
        (-9.008924778, 0.75, 8.665406761),
    ]]
    fillet(fillet1_edges, radius=FILLET1_R)

    # Sketch2 → Boss-Extrude2 (add)
    with BuildSketch(Plane.XZ.offset(BOSS_EXTRUDE2_START)):
        with Locations(Location((0, 0, 0), (0, 0, 90))):
            Circle(SKETCH2_R)
        with Locations(Location((0, 0, 0), (0, 0, 270))):
            Circle(SKETCH2_R_2, mode=Mode.SUBTRACT)
    extrude(amount=-BOSS_EXTRUDE2_DEPTH)


solid = part.part
